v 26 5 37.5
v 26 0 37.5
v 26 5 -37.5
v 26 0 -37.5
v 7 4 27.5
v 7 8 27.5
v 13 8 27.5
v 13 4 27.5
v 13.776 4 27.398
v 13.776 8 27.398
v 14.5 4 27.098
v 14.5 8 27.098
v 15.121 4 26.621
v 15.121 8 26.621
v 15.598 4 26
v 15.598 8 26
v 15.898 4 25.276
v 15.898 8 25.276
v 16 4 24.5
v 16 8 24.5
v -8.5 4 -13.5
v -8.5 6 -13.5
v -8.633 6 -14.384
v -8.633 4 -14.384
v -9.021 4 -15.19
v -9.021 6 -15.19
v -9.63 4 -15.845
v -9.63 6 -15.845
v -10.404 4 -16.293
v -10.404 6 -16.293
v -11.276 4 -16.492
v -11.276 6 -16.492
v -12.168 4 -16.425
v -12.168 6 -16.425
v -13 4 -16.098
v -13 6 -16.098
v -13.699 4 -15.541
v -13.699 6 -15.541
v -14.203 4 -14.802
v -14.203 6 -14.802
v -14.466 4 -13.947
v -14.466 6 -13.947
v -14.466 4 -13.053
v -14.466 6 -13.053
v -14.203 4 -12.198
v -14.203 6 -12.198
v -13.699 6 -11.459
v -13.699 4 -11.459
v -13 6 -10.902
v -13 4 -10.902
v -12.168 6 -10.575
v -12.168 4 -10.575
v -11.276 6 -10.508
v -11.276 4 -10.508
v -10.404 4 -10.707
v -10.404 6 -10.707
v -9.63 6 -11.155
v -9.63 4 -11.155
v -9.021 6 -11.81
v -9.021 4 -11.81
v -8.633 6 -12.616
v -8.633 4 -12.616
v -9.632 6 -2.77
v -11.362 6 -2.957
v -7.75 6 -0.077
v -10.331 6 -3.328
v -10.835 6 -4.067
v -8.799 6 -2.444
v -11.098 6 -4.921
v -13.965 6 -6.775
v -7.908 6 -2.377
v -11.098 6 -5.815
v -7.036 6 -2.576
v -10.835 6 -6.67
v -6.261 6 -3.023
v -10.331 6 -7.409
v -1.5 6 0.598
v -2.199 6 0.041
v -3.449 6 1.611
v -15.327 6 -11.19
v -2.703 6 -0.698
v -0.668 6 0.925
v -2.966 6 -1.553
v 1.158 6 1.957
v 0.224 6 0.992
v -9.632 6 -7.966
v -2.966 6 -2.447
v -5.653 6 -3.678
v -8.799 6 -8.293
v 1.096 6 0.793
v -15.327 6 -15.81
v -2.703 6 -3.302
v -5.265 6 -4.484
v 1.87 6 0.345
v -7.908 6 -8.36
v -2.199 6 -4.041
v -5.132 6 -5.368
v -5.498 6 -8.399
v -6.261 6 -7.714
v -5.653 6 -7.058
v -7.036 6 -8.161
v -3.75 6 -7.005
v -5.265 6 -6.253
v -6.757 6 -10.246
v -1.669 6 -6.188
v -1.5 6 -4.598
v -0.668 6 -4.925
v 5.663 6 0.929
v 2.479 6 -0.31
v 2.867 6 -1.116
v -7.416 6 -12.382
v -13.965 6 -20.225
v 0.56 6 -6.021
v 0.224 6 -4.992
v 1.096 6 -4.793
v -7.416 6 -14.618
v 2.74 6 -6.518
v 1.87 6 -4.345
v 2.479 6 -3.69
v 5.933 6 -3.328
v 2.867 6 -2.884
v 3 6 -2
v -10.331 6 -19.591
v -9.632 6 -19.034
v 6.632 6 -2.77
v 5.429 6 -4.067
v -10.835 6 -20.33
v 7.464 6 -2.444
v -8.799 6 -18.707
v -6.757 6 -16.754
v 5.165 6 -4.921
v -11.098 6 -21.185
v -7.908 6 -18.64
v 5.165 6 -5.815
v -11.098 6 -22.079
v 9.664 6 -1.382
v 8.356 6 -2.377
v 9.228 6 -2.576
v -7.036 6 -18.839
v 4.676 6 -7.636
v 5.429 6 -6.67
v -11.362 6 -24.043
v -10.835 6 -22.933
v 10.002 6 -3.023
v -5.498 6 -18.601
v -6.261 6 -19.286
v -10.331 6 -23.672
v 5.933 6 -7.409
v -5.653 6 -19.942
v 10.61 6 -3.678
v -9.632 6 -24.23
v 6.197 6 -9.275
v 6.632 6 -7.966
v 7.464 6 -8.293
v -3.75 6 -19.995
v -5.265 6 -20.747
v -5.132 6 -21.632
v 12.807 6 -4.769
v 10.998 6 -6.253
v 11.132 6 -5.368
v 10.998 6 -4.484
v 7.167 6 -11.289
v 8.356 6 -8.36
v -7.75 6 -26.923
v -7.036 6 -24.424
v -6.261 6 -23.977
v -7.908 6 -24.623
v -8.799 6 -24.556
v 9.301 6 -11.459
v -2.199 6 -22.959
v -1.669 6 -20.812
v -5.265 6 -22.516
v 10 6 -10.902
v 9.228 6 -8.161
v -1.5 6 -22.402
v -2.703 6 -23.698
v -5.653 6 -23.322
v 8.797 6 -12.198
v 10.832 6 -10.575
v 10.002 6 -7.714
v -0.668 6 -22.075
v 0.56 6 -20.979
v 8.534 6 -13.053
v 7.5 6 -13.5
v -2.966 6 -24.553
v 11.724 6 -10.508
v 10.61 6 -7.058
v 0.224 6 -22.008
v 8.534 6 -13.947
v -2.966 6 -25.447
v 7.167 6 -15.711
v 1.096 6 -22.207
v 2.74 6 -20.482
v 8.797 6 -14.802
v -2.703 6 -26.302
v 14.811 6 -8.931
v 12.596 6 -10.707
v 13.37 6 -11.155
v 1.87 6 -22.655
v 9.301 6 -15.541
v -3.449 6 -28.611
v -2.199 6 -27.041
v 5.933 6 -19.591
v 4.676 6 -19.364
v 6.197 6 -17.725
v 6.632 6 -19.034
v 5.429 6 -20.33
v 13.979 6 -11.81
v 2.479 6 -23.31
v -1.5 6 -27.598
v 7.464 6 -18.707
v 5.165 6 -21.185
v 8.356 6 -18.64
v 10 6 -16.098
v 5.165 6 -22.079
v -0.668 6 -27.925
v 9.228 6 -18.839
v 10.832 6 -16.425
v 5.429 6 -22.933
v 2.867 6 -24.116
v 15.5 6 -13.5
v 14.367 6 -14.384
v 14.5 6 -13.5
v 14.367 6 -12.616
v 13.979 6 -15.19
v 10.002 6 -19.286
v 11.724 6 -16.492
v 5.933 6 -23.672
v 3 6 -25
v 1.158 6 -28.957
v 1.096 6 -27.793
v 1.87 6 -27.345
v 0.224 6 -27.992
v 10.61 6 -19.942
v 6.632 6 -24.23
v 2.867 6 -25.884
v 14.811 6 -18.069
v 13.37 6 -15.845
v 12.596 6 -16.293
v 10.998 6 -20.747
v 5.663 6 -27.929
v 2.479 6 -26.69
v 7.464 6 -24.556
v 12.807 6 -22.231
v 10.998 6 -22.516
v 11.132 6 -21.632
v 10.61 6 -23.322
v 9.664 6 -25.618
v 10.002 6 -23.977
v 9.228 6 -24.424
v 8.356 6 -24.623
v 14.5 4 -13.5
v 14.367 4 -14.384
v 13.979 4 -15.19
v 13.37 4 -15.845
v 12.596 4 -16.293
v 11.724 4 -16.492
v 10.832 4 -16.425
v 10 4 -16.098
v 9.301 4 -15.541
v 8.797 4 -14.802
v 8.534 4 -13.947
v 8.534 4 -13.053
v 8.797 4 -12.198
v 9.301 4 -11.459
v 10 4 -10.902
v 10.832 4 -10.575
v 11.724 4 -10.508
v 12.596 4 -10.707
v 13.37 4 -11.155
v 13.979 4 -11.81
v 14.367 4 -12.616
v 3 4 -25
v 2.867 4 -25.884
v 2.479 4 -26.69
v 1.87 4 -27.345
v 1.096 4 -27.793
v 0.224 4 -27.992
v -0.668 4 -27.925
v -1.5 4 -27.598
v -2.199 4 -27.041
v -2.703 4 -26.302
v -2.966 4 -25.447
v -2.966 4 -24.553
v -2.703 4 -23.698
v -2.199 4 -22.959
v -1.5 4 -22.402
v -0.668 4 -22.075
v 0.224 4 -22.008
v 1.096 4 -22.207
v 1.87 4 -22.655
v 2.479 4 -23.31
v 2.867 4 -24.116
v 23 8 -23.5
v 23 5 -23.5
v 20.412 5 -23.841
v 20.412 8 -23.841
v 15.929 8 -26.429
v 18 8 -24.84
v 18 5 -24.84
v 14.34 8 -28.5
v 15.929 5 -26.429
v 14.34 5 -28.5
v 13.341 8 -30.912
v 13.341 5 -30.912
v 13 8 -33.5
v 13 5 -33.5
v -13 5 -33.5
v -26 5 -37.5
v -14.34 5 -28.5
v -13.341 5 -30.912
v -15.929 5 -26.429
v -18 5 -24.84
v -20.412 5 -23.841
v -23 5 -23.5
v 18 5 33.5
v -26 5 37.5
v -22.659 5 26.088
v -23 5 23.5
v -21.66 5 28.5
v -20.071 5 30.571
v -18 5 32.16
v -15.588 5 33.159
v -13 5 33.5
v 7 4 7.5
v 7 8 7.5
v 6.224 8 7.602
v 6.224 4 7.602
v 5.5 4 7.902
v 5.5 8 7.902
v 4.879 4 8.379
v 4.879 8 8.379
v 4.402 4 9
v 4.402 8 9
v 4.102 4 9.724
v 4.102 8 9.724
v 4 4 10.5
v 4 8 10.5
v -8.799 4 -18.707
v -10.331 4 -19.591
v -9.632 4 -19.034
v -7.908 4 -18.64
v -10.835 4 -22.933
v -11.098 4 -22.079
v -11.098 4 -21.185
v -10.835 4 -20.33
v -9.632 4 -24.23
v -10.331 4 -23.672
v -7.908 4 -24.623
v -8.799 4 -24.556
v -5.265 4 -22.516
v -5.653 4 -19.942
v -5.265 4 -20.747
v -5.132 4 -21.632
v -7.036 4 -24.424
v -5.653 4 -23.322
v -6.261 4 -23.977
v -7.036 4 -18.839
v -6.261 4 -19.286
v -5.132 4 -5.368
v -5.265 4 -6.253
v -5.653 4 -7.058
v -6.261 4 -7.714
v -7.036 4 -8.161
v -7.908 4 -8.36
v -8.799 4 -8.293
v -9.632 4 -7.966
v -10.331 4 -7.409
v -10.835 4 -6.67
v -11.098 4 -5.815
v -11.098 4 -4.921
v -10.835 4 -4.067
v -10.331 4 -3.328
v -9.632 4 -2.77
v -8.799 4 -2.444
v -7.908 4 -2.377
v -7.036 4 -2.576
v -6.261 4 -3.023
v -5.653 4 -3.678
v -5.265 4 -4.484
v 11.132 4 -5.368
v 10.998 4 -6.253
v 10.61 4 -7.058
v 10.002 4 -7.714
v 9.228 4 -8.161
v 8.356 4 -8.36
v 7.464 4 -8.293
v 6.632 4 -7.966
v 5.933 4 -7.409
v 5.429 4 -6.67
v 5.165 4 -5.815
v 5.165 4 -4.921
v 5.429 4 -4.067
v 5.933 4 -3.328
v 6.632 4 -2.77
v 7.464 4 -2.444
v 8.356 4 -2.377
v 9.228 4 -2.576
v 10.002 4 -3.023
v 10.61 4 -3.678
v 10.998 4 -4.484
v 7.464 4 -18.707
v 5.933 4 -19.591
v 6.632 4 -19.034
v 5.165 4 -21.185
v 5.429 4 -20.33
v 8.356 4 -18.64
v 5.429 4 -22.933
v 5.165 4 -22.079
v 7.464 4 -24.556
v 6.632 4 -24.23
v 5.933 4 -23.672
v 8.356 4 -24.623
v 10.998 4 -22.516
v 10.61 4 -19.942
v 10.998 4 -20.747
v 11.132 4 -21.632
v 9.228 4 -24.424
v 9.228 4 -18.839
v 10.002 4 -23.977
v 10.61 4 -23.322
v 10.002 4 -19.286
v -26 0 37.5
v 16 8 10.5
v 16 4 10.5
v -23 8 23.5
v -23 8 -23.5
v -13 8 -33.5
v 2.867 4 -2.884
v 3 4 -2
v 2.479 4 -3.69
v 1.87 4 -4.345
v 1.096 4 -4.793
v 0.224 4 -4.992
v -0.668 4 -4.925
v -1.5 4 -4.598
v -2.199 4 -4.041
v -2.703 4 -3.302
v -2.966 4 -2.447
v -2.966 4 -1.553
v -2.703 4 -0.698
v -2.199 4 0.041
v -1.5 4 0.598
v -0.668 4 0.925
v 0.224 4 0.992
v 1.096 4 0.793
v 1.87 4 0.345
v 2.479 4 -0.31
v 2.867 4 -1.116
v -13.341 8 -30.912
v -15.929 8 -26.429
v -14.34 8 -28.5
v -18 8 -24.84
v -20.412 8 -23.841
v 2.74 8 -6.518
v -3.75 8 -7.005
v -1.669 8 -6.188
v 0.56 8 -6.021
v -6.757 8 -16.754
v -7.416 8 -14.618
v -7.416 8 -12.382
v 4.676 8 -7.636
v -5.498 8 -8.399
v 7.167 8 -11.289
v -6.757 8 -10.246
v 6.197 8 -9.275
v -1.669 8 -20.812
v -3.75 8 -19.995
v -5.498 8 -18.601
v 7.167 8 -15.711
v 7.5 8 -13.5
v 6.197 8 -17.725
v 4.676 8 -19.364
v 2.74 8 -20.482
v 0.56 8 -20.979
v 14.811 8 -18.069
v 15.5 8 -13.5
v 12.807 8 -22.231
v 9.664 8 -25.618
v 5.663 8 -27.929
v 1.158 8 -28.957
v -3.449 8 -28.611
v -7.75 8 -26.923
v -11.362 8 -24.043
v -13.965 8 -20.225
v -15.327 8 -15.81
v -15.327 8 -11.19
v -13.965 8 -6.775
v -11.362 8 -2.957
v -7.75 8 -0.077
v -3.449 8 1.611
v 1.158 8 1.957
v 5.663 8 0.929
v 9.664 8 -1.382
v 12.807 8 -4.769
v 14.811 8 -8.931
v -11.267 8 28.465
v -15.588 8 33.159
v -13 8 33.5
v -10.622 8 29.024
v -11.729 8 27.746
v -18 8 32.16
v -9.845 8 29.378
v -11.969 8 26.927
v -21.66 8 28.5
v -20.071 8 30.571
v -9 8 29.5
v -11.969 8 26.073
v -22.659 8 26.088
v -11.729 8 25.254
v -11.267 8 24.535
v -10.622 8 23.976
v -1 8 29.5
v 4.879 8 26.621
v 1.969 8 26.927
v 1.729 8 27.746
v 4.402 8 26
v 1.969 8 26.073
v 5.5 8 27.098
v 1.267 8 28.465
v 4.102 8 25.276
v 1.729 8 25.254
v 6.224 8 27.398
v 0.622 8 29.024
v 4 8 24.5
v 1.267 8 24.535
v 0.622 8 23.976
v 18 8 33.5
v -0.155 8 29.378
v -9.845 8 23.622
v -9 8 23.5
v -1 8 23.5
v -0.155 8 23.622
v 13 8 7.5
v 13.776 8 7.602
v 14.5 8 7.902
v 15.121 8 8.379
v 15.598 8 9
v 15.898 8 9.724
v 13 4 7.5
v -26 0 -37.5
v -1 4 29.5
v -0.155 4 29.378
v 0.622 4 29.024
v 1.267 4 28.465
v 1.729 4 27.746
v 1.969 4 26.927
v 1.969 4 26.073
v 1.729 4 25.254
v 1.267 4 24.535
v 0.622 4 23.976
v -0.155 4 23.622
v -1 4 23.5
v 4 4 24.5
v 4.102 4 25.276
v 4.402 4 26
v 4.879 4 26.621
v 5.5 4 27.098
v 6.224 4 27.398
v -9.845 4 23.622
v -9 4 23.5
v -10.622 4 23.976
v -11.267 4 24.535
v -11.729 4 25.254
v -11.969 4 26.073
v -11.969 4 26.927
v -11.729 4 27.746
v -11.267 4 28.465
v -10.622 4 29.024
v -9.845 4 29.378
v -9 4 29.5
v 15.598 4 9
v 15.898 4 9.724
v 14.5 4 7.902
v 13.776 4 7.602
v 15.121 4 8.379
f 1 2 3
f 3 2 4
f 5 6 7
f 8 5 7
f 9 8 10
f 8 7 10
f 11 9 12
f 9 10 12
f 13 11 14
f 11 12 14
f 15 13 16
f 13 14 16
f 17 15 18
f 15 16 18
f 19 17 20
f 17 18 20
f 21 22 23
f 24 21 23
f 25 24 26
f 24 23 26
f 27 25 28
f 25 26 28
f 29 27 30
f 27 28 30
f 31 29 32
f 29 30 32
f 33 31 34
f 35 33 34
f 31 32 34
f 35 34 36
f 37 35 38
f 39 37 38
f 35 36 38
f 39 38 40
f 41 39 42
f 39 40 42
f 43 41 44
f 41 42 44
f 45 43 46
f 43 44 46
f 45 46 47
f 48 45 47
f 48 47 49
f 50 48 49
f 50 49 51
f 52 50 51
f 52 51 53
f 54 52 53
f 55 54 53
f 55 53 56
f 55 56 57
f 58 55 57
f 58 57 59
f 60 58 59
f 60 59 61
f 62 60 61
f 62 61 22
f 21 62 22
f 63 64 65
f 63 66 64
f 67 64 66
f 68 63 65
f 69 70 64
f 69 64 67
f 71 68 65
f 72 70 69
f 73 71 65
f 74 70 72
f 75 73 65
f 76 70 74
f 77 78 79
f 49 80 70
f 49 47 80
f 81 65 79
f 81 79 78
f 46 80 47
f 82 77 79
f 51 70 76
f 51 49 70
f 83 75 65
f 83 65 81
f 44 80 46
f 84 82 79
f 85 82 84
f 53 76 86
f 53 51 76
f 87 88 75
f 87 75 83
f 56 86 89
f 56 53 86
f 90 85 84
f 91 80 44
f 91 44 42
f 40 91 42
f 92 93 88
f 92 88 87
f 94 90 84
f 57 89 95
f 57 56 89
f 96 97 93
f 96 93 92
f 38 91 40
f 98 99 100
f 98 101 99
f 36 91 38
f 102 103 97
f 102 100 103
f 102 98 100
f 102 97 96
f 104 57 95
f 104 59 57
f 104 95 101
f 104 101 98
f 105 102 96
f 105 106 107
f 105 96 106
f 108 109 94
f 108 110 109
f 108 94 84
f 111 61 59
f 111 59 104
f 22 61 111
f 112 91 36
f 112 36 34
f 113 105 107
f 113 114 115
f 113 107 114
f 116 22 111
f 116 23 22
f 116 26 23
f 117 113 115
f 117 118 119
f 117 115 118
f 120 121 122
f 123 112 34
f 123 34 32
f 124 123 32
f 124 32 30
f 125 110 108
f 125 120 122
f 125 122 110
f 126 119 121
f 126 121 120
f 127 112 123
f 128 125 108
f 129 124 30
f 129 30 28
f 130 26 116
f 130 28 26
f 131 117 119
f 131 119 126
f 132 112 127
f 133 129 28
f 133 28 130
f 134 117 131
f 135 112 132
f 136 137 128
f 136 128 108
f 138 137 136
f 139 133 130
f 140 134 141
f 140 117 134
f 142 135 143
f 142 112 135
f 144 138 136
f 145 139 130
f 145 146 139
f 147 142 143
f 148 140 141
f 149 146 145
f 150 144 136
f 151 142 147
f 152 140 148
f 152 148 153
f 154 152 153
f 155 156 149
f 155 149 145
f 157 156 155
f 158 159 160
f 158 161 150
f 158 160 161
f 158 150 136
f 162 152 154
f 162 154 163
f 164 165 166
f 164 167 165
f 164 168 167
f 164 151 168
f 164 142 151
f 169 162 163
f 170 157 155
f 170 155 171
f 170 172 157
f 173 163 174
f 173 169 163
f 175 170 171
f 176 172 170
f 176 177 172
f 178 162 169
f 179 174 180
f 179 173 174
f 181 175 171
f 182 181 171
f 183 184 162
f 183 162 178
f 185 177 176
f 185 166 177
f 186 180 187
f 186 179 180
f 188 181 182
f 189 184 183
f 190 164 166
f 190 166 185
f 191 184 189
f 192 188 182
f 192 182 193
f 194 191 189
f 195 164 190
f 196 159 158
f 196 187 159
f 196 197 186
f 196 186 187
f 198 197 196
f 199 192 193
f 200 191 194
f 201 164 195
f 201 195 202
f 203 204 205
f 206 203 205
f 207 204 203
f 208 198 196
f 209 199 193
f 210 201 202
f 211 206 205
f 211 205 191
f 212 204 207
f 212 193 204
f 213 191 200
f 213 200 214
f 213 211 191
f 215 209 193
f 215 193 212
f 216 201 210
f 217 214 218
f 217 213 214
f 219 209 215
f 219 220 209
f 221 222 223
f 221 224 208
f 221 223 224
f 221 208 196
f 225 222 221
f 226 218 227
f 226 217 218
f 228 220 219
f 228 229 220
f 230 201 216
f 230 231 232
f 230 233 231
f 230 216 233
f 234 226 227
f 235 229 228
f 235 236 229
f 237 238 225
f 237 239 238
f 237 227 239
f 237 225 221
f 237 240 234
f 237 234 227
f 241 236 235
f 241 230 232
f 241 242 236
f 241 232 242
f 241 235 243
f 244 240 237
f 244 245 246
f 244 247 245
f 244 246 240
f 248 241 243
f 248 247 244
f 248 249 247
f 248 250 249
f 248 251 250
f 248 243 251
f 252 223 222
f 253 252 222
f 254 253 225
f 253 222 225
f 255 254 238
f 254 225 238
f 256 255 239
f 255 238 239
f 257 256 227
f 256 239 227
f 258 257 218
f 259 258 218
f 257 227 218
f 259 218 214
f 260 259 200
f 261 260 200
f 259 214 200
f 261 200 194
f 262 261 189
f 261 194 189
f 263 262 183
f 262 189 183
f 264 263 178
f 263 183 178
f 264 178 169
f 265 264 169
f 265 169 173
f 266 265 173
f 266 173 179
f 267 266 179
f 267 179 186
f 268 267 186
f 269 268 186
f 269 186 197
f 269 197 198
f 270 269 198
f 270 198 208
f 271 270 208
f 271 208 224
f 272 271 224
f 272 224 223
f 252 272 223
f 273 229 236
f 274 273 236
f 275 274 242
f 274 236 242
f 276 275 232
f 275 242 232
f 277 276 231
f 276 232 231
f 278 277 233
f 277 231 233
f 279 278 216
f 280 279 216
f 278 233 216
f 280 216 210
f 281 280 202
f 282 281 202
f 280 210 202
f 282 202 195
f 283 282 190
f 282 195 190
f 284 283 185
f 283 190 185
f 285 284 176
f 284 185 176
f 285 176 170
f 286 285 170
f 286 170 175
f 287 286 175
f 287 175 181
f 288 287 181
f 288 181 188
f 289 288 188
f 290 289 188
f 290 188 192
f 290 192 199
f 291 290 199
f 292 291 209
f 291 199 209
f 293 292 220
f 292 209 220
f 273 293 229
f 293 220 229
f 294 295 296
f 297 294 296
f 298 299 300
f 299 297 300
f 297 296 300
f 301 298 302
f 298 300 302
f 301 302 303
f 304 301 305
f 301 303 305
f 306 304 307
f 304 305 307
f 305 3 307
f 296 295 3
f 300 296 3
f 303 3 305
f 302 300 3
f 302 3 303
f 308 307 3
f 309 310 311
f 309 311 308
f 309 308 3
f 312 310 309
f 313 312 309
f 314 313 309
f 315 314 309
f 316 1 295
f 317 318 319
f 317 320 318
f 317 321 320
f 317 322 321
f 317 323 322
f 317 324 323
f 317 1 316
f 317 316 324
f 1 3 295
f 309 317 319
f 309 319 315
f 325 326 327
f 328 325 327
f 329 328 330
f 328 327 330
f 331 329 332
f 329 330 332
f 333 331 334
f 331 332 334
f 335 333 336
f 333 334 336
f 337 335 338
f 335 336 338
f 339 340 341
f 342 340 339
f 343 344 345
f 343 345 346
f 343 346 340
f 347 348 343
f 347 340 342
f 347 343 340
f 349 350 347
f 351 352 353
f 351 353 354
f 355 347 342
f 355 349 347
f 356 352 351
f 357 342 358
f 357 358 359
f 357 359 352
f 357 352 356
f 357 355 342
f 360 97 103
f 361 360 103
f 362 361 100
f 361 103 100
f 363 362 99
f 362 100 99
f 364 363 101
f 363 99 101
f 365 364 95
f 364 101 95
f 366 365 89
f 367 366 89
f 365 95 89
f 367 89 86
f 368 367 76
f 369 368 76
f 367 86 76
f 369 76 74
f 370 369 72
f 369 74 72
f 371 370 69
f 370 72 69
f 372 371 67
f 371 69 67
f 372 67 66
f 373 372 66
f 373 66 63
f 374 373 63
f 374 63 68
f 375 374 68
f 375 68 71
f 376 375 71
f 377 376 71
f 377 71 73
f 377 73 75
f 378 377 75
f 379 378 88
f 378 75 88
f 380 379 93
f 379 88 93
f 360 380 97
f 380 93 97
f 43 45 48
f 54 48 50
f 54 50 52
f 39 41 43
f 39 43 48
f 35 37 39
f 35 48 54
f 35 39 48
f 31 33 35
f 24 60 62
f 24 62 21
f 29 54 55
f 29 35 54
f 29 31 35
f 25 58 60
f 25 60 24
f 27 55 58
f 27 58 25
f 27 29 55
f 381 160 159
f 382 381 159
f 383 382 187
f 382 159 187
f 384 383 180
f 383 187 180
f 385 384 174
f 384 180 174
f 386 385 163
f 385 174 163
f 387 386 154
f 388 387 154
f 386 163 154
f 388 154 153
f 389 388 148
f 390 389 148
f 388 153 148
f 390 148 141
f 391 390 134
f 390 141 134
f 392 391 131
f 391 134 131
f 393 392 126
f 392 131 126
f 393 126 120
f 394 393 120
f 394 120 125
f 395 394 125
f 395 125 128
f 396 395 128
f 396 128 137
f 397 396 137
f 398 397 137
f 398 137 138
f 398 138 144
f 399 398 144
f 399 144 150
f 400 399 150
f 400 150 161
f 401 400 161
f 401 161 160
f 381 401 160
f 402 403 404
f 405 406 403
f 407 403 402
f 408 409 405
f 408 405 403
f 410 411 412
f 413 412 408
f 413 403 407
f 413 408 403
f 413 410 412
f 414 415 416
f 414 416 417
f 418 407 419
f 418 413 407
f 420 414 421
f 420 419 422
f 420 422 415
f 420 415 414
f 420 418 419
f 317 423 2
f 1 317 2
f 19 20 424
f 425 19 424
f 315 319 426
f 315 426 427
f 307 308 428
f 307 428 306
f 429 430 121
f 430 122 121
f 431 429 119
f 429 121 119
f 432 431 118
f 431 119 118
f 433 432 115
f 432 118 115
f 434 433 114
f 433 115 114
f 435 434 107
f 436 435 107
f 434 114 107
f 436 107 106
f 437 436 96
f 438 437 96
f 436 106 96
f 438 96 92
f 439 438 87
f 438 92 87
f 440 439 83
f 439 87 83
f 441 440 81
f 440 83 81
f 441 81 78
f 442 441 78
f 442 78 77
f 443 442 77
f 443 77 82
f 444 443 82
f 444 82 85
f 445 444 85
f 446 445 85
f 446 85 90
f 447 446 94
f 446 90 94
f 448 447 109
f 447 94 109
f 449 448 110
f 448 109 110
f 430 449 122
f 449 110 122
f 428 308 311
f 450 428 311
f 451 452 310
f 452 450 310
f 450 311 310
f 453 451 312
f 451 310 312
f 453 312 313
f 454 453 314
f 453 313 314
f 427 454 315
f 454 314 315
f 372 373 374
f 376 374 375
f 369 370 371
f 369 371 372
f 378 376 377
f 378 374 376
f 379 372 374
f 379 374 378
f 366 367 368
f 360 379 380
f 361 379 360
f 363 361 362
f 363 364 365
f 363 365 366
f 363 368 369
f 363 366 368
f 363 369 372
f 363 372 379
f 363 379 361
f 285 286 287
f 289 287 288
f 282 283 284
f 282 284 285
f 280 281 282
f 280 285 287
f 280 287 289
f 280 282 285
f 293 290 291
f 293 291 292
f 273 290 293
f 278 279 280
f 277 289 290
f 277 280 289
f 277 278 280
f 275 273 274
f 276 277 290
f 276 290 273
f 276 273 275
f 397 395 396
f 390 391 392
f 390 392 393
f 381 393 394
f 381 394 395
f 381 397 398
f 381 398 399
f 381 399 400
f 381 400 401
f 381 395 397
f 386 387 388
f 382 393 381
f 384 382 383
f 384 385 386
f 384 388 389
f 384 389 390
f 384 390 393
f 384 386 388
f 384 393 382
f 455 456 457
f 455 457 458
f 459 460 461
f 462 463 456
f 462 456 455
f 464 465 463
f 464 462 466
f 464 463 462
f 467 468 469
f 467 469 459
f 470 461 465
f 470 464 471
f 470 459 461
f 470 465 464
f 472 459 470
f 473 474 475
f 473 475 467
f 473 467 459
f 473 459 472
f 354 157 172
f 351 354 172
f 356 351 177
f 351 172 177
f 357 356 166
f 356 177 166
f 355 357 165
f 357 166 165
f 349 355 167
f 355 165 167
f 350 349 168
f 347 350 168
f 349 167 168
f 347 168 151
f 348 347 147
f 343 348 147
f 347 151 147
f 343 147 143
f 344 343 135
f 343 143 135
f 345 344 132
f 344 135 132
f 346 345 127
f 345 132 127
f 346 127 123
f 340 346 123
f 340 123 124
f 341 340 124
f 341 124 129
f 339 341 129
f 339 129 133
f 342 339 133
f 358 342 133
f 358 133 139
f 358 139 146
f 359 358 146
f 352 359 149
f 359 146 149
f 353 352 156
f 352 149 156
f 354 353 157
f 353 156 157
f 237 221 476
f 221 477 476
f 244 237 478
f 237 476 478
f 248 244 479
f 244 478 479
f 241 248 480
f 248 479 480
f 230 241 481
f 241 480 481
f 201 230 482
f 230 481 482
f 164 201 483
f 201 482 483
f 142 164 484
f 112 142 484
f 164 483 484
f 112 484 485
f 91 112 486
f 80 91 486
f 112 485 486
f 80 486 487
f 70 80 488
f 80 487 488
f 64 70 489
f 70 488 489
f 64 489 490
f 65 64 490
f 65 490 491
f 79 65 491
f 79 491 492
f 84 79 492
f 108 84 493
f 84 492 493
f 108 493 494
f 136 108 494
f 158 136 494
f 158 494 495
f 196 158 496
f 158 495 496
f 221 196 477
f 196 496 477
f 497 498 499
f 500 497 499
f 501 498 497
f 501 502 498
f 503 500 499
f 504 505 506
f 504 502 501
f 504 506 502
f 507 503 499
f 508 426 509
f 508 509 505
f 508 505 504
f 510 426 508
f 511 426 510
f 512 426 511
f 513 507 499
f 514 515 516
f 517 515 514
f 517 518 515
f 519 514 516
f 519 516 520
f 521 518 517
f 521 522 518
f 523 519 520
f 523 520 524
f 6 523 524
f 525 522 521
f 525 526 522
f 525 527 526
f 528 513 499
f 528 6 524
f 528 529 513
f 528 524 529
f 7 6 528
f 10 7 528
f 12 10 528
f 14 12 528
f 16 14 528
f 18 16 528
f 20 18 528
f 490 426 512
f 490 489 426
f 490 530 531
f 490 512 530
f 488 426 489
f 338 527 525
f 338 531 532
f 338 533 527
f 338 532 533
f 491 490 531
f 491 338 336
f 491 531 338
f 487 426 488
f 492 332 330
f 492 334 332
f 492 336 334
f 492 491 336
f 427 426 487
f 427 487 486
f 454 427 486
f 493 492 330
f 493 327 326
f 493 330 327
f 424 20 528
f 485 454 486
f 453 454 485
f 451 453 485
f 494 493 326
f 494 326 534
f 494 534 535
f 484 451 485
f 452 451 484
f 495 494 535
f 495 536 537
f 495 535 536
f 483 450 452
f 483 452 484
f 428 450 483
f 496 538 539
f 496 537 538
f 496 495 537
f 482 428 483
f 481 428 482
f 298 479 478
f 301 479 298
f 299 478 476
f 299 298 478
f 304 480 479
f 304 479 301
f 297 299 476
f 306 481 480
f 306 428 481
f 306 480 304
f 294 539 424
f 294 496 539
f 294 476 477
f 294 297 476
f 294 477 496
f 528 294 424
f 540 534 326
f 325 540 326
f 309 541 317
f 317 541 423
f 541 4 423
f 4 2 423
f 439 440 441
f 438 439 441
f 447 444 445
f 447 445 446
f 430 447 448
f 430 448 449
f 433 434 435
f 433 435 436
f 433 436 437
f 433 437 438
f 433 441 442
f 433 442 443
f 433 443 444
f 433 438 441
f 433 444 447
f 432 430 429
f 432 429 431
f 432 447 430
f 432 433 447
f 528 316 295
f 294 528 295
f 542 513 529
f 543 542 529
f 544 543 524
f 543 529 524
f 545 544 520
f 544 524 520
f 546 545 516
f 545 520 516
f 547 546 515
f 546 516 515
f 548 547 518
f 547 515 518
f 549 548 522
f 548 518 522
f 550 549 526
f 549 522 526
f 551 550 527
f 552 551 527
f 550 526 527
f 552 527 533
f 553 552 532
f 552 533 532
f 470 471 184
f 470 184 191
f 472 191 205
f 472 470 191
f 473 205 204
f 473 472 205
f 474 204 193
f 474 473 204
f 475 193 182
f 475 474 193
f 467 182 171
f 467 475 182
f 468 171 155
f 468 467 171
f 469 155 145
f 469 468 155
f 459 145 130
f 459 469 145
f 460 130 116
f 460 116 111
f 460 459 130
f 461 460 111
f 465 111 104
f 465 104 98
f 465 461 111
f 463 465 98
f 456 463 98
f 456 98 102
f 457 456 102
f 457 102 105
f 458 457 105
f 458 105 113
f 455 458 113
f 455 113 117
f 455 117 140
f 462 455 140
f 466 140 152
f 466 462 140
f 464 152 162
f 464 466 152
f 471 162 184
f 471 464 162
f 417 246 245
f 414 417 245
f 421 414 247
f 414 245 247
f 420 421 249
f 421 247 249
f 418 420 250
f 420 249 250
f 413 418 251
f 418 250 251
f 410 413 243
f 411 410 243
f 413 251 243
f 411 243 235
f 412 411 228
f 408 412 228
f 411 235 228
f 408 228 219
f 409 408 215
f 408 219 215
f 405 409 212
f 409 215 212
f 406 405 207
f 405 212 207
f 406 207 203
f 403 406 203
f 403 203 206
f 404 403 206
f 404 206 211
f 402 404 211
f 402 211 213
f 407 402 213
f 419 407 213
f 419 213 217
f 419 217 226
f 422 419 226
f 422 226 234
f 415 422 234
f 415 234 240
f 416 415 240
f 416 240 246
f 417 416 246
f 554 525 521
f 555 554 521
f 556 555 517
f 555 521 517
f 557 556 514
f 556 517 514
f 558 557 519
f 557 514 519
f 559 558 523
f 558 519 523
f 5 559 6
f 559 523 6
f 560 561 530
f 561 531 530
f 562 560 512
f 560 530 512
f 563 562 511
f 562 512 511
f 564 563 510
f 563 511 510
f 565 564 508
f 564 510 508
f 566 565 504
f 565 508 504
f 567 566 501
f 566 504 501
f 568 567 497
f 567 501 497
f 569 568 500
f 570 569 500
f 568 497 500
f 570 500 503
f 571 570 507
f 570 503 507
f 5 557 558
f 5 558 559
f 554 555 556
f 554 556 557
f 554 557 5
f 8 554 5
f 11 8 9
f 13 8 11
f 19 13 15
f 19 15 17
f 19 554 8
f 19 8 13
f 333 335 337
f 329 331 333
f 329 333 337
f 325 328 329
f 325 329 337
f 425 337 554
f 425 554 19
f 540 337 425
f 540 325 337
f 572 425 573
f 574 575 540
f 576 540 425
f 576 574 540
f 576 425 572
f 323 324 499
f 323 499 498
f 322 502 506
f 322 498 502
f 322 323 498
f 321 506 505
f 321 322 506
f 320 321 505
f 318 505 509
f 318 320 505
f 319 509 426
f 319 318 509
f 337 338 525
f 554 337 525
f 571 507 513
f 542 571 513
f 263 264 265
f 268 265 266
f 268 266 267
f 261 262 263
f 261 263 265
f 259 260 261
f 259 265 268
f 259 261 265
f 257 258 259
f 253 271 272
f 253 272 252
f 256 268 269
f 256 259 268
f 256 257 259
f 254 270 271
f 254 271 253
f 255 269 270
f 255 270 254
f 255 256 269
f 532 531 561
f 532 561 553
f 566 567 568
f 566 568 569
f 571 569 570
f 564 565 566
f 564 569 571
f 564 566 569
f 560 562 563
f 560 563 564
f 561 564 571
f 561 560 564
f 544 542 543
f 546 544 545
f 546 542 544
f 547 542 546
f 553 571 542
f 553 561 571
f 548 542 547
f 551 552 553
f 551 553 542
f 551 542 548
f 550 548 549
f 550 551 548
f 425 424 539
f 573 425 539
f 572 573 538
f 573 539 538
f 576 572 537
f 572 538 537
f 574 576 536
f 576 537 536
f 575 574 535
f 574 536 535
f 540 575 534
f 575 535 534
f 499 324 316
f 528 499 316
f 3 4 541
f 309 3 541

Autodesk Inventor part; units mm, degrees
ref_plane "YZ Plane" through (0, 0, 0) normal (1, 0, 0) x (0, 1, 0)
ref_plane "XZ Plane" through (0, 0, 0) normal (0, 1, 0) x (-1, 0, 0)
ref_plane "XY Plane" through (0, 0, 0) normal (0, 0, 1) x (1, 0, 0)
sketch "Sketch1" plane through (0, 0, 0) normal (0, 1, 0) x (-1, 0, 0)
  line L0 (26, 37.5) -> (-26, 37.5)
  line L1 (-26, 37.5) -> (-26, -37.5)
  line L2 (-26, -37.5) -> (26, -37.5)
  line L3 (26, -37.5) -> (26, 37.5)
  line L4 (26, 37.5) -> (-26, -37.5) construction
  line L5 (-26, 37.5) -> (26, -37.5) construction
  point P0 (0, 0)
  dimension "d0" = 52
  dimension "d1" = 75
extrude "Extrusion1" add sketch "Sketch1" along normal blind 5
sketch "Sketch2" plane through (0, 5, 0) normal (0, 1, 0) x (1, 0, 0)
  line L0 (-13, -33.5) -> (35.879, -33.5)
  line L1 (-26, -37.5) -> (26, -37.5) projected
  line L2 (-23, -23.5) -> (-23, 74.0013)
  line L3 (-26, 37.5) -> (-26, -37.5) projected
  arc A0 (-23, 23.5) -> (-13, 33.5) centre (-23, 33.5) ccw
  line L4 (26, 37.5) -> (-26, 37.5) projected
  arc A1 (13, 33.5) -> (23, 23.5) centre (23, 33.5) ccw
  line L5 (26, -37.5) -> (26, 37.5) projected
  line L6 (-13, 33.5) -> (13, 33.5)
  line L7 (18, -33.5) -> (23, 23.5)
  arc A2 (-23, -23.5) -> (-13, -33.5) centre (-13, -23.5) ccw
  point P0 (0, 0)
  dimension "d4" = 4
  dimension "d5" = 3
  dimension "d6" = 20
  dimension "d7" = 4
  dimension "d8" = 20
  dimension "d9" = 4
  dimension "d10" = 3
  dimension "d11" = 8
  dimension "d12" = 3
  dimension "d13" = 10
extrude "Extrusion2" add sketch "Sketch2" along normal blind 3 contours A2 L2 A0 L6 A1 L7 L0
sketch "Sketch3" plane through (0, 8, 0) normal (0, 1, 0) x (1, 0, 0)
  line L0 (4, -10.5) -> (4, -24.5)
  line L1 (7, -27.5) -> (13, -27.5)
  line L2 (16, -24.5) -> (16, -10.5)
  line L3 (13, -7.5) -> (7, -7.5)
  line L4 (26, -37.5) -> (26, 37.5) projected
  line L5 (-26, -37.5) -> (26, -37.5) projected
  arc A0 (4, -24.5) -> (7, -27.5) centre (7, -24.5) ccw
  arc A1 (7, -7.5) -> (4, -10.5) centre (7, -10.5) ccw
  arc A2 (16, -10.5) -> (13, -7.5) centre (13, -10.5) ccw
  arc A3 (13, -27.5) -> (16, -24.5) centre (13, -24.5) ccw
  arc A4 (-9, -23.5) -> (-9, -29.5) centre (-9, -26.5) ccw
  arc A5 (-1, -29.5) -> (-1, -23.5) centre (-1, -26.5) ccw
  line L6 (-9, -23.5) -> (-1, -23.5)
  line L7 (-9, -29.5) -> (-1, -29.5)
  circle A6 centre (0, 13.5) radius 7.5
  circle A7 centre (0, 2) radius 3
  circle A8 centre (-8.1317, 5.3683) radius 3
  circle A9 centre (-11.5, 13.5) radius 3
  circle A10 centre (-8.1317, 21.6317) radius 3
  circle A11 centre (0, 25) radius 3
  circle A12 centre (8.1317, 21.6317) radius 3
  circle A13 centre (11.5, 13.5) radius 3
  circle A14 centre (8.1317, 5.3683) radius 3
  point P0 (0, 0)
  point P1 (4, -7.5)
  point P2 (4, -27.5)
  point P3 (16, -27.5)
  dimension "d16" = 22
  dimension "d17" = 30
  dimension "d18" = 20
  dimension "d19" = 12
  dimension "d20" = 3
  dimension "d21" = 6
  dimension "d22" = 6
  dimension "d23" = 27
  dimension "d24" = 11
  dimension "d25" = 11
  dimension "d26" = 35
  dimension "d27" = 15
  dimension "d28" = 51
  dimension "d29" = 26
  dimension "d30" = 6
  dimension "d31" = 11.5
  dimension "d34" = 360
extrude "Extrusion3" cut sketch "Sketch3" against normal blind 4 contours A1 L3 A2 L2 A3 L1 A0 L0 | L6 A5 L7 A4 | A7 | A8 | A9 | A10 | A11 | A12 | A13 | A14
sketch "Sketch4" plane through (0, 8, 0) normal (0, 1, 0) x (1, 0, 0)
  circle A0 centre (0, 13.5) radius 7.5
  line L0 (26, -37.5) -> (26, 37.5) projected
  line L1 (-26, -37.5) -> (26, -37.5) projected
  circle A1 centre (0, 13.5) radius 15.5
  point P0 (0, 0)
  dimension "d38" = 15
  dimension "d39" = 26
  dimension "d40" = 51
  dimension "d41" = 31
extrude "Extrusion4" cut sketch "Sketch4" against normal blind 2
properties part number "A2P2"
